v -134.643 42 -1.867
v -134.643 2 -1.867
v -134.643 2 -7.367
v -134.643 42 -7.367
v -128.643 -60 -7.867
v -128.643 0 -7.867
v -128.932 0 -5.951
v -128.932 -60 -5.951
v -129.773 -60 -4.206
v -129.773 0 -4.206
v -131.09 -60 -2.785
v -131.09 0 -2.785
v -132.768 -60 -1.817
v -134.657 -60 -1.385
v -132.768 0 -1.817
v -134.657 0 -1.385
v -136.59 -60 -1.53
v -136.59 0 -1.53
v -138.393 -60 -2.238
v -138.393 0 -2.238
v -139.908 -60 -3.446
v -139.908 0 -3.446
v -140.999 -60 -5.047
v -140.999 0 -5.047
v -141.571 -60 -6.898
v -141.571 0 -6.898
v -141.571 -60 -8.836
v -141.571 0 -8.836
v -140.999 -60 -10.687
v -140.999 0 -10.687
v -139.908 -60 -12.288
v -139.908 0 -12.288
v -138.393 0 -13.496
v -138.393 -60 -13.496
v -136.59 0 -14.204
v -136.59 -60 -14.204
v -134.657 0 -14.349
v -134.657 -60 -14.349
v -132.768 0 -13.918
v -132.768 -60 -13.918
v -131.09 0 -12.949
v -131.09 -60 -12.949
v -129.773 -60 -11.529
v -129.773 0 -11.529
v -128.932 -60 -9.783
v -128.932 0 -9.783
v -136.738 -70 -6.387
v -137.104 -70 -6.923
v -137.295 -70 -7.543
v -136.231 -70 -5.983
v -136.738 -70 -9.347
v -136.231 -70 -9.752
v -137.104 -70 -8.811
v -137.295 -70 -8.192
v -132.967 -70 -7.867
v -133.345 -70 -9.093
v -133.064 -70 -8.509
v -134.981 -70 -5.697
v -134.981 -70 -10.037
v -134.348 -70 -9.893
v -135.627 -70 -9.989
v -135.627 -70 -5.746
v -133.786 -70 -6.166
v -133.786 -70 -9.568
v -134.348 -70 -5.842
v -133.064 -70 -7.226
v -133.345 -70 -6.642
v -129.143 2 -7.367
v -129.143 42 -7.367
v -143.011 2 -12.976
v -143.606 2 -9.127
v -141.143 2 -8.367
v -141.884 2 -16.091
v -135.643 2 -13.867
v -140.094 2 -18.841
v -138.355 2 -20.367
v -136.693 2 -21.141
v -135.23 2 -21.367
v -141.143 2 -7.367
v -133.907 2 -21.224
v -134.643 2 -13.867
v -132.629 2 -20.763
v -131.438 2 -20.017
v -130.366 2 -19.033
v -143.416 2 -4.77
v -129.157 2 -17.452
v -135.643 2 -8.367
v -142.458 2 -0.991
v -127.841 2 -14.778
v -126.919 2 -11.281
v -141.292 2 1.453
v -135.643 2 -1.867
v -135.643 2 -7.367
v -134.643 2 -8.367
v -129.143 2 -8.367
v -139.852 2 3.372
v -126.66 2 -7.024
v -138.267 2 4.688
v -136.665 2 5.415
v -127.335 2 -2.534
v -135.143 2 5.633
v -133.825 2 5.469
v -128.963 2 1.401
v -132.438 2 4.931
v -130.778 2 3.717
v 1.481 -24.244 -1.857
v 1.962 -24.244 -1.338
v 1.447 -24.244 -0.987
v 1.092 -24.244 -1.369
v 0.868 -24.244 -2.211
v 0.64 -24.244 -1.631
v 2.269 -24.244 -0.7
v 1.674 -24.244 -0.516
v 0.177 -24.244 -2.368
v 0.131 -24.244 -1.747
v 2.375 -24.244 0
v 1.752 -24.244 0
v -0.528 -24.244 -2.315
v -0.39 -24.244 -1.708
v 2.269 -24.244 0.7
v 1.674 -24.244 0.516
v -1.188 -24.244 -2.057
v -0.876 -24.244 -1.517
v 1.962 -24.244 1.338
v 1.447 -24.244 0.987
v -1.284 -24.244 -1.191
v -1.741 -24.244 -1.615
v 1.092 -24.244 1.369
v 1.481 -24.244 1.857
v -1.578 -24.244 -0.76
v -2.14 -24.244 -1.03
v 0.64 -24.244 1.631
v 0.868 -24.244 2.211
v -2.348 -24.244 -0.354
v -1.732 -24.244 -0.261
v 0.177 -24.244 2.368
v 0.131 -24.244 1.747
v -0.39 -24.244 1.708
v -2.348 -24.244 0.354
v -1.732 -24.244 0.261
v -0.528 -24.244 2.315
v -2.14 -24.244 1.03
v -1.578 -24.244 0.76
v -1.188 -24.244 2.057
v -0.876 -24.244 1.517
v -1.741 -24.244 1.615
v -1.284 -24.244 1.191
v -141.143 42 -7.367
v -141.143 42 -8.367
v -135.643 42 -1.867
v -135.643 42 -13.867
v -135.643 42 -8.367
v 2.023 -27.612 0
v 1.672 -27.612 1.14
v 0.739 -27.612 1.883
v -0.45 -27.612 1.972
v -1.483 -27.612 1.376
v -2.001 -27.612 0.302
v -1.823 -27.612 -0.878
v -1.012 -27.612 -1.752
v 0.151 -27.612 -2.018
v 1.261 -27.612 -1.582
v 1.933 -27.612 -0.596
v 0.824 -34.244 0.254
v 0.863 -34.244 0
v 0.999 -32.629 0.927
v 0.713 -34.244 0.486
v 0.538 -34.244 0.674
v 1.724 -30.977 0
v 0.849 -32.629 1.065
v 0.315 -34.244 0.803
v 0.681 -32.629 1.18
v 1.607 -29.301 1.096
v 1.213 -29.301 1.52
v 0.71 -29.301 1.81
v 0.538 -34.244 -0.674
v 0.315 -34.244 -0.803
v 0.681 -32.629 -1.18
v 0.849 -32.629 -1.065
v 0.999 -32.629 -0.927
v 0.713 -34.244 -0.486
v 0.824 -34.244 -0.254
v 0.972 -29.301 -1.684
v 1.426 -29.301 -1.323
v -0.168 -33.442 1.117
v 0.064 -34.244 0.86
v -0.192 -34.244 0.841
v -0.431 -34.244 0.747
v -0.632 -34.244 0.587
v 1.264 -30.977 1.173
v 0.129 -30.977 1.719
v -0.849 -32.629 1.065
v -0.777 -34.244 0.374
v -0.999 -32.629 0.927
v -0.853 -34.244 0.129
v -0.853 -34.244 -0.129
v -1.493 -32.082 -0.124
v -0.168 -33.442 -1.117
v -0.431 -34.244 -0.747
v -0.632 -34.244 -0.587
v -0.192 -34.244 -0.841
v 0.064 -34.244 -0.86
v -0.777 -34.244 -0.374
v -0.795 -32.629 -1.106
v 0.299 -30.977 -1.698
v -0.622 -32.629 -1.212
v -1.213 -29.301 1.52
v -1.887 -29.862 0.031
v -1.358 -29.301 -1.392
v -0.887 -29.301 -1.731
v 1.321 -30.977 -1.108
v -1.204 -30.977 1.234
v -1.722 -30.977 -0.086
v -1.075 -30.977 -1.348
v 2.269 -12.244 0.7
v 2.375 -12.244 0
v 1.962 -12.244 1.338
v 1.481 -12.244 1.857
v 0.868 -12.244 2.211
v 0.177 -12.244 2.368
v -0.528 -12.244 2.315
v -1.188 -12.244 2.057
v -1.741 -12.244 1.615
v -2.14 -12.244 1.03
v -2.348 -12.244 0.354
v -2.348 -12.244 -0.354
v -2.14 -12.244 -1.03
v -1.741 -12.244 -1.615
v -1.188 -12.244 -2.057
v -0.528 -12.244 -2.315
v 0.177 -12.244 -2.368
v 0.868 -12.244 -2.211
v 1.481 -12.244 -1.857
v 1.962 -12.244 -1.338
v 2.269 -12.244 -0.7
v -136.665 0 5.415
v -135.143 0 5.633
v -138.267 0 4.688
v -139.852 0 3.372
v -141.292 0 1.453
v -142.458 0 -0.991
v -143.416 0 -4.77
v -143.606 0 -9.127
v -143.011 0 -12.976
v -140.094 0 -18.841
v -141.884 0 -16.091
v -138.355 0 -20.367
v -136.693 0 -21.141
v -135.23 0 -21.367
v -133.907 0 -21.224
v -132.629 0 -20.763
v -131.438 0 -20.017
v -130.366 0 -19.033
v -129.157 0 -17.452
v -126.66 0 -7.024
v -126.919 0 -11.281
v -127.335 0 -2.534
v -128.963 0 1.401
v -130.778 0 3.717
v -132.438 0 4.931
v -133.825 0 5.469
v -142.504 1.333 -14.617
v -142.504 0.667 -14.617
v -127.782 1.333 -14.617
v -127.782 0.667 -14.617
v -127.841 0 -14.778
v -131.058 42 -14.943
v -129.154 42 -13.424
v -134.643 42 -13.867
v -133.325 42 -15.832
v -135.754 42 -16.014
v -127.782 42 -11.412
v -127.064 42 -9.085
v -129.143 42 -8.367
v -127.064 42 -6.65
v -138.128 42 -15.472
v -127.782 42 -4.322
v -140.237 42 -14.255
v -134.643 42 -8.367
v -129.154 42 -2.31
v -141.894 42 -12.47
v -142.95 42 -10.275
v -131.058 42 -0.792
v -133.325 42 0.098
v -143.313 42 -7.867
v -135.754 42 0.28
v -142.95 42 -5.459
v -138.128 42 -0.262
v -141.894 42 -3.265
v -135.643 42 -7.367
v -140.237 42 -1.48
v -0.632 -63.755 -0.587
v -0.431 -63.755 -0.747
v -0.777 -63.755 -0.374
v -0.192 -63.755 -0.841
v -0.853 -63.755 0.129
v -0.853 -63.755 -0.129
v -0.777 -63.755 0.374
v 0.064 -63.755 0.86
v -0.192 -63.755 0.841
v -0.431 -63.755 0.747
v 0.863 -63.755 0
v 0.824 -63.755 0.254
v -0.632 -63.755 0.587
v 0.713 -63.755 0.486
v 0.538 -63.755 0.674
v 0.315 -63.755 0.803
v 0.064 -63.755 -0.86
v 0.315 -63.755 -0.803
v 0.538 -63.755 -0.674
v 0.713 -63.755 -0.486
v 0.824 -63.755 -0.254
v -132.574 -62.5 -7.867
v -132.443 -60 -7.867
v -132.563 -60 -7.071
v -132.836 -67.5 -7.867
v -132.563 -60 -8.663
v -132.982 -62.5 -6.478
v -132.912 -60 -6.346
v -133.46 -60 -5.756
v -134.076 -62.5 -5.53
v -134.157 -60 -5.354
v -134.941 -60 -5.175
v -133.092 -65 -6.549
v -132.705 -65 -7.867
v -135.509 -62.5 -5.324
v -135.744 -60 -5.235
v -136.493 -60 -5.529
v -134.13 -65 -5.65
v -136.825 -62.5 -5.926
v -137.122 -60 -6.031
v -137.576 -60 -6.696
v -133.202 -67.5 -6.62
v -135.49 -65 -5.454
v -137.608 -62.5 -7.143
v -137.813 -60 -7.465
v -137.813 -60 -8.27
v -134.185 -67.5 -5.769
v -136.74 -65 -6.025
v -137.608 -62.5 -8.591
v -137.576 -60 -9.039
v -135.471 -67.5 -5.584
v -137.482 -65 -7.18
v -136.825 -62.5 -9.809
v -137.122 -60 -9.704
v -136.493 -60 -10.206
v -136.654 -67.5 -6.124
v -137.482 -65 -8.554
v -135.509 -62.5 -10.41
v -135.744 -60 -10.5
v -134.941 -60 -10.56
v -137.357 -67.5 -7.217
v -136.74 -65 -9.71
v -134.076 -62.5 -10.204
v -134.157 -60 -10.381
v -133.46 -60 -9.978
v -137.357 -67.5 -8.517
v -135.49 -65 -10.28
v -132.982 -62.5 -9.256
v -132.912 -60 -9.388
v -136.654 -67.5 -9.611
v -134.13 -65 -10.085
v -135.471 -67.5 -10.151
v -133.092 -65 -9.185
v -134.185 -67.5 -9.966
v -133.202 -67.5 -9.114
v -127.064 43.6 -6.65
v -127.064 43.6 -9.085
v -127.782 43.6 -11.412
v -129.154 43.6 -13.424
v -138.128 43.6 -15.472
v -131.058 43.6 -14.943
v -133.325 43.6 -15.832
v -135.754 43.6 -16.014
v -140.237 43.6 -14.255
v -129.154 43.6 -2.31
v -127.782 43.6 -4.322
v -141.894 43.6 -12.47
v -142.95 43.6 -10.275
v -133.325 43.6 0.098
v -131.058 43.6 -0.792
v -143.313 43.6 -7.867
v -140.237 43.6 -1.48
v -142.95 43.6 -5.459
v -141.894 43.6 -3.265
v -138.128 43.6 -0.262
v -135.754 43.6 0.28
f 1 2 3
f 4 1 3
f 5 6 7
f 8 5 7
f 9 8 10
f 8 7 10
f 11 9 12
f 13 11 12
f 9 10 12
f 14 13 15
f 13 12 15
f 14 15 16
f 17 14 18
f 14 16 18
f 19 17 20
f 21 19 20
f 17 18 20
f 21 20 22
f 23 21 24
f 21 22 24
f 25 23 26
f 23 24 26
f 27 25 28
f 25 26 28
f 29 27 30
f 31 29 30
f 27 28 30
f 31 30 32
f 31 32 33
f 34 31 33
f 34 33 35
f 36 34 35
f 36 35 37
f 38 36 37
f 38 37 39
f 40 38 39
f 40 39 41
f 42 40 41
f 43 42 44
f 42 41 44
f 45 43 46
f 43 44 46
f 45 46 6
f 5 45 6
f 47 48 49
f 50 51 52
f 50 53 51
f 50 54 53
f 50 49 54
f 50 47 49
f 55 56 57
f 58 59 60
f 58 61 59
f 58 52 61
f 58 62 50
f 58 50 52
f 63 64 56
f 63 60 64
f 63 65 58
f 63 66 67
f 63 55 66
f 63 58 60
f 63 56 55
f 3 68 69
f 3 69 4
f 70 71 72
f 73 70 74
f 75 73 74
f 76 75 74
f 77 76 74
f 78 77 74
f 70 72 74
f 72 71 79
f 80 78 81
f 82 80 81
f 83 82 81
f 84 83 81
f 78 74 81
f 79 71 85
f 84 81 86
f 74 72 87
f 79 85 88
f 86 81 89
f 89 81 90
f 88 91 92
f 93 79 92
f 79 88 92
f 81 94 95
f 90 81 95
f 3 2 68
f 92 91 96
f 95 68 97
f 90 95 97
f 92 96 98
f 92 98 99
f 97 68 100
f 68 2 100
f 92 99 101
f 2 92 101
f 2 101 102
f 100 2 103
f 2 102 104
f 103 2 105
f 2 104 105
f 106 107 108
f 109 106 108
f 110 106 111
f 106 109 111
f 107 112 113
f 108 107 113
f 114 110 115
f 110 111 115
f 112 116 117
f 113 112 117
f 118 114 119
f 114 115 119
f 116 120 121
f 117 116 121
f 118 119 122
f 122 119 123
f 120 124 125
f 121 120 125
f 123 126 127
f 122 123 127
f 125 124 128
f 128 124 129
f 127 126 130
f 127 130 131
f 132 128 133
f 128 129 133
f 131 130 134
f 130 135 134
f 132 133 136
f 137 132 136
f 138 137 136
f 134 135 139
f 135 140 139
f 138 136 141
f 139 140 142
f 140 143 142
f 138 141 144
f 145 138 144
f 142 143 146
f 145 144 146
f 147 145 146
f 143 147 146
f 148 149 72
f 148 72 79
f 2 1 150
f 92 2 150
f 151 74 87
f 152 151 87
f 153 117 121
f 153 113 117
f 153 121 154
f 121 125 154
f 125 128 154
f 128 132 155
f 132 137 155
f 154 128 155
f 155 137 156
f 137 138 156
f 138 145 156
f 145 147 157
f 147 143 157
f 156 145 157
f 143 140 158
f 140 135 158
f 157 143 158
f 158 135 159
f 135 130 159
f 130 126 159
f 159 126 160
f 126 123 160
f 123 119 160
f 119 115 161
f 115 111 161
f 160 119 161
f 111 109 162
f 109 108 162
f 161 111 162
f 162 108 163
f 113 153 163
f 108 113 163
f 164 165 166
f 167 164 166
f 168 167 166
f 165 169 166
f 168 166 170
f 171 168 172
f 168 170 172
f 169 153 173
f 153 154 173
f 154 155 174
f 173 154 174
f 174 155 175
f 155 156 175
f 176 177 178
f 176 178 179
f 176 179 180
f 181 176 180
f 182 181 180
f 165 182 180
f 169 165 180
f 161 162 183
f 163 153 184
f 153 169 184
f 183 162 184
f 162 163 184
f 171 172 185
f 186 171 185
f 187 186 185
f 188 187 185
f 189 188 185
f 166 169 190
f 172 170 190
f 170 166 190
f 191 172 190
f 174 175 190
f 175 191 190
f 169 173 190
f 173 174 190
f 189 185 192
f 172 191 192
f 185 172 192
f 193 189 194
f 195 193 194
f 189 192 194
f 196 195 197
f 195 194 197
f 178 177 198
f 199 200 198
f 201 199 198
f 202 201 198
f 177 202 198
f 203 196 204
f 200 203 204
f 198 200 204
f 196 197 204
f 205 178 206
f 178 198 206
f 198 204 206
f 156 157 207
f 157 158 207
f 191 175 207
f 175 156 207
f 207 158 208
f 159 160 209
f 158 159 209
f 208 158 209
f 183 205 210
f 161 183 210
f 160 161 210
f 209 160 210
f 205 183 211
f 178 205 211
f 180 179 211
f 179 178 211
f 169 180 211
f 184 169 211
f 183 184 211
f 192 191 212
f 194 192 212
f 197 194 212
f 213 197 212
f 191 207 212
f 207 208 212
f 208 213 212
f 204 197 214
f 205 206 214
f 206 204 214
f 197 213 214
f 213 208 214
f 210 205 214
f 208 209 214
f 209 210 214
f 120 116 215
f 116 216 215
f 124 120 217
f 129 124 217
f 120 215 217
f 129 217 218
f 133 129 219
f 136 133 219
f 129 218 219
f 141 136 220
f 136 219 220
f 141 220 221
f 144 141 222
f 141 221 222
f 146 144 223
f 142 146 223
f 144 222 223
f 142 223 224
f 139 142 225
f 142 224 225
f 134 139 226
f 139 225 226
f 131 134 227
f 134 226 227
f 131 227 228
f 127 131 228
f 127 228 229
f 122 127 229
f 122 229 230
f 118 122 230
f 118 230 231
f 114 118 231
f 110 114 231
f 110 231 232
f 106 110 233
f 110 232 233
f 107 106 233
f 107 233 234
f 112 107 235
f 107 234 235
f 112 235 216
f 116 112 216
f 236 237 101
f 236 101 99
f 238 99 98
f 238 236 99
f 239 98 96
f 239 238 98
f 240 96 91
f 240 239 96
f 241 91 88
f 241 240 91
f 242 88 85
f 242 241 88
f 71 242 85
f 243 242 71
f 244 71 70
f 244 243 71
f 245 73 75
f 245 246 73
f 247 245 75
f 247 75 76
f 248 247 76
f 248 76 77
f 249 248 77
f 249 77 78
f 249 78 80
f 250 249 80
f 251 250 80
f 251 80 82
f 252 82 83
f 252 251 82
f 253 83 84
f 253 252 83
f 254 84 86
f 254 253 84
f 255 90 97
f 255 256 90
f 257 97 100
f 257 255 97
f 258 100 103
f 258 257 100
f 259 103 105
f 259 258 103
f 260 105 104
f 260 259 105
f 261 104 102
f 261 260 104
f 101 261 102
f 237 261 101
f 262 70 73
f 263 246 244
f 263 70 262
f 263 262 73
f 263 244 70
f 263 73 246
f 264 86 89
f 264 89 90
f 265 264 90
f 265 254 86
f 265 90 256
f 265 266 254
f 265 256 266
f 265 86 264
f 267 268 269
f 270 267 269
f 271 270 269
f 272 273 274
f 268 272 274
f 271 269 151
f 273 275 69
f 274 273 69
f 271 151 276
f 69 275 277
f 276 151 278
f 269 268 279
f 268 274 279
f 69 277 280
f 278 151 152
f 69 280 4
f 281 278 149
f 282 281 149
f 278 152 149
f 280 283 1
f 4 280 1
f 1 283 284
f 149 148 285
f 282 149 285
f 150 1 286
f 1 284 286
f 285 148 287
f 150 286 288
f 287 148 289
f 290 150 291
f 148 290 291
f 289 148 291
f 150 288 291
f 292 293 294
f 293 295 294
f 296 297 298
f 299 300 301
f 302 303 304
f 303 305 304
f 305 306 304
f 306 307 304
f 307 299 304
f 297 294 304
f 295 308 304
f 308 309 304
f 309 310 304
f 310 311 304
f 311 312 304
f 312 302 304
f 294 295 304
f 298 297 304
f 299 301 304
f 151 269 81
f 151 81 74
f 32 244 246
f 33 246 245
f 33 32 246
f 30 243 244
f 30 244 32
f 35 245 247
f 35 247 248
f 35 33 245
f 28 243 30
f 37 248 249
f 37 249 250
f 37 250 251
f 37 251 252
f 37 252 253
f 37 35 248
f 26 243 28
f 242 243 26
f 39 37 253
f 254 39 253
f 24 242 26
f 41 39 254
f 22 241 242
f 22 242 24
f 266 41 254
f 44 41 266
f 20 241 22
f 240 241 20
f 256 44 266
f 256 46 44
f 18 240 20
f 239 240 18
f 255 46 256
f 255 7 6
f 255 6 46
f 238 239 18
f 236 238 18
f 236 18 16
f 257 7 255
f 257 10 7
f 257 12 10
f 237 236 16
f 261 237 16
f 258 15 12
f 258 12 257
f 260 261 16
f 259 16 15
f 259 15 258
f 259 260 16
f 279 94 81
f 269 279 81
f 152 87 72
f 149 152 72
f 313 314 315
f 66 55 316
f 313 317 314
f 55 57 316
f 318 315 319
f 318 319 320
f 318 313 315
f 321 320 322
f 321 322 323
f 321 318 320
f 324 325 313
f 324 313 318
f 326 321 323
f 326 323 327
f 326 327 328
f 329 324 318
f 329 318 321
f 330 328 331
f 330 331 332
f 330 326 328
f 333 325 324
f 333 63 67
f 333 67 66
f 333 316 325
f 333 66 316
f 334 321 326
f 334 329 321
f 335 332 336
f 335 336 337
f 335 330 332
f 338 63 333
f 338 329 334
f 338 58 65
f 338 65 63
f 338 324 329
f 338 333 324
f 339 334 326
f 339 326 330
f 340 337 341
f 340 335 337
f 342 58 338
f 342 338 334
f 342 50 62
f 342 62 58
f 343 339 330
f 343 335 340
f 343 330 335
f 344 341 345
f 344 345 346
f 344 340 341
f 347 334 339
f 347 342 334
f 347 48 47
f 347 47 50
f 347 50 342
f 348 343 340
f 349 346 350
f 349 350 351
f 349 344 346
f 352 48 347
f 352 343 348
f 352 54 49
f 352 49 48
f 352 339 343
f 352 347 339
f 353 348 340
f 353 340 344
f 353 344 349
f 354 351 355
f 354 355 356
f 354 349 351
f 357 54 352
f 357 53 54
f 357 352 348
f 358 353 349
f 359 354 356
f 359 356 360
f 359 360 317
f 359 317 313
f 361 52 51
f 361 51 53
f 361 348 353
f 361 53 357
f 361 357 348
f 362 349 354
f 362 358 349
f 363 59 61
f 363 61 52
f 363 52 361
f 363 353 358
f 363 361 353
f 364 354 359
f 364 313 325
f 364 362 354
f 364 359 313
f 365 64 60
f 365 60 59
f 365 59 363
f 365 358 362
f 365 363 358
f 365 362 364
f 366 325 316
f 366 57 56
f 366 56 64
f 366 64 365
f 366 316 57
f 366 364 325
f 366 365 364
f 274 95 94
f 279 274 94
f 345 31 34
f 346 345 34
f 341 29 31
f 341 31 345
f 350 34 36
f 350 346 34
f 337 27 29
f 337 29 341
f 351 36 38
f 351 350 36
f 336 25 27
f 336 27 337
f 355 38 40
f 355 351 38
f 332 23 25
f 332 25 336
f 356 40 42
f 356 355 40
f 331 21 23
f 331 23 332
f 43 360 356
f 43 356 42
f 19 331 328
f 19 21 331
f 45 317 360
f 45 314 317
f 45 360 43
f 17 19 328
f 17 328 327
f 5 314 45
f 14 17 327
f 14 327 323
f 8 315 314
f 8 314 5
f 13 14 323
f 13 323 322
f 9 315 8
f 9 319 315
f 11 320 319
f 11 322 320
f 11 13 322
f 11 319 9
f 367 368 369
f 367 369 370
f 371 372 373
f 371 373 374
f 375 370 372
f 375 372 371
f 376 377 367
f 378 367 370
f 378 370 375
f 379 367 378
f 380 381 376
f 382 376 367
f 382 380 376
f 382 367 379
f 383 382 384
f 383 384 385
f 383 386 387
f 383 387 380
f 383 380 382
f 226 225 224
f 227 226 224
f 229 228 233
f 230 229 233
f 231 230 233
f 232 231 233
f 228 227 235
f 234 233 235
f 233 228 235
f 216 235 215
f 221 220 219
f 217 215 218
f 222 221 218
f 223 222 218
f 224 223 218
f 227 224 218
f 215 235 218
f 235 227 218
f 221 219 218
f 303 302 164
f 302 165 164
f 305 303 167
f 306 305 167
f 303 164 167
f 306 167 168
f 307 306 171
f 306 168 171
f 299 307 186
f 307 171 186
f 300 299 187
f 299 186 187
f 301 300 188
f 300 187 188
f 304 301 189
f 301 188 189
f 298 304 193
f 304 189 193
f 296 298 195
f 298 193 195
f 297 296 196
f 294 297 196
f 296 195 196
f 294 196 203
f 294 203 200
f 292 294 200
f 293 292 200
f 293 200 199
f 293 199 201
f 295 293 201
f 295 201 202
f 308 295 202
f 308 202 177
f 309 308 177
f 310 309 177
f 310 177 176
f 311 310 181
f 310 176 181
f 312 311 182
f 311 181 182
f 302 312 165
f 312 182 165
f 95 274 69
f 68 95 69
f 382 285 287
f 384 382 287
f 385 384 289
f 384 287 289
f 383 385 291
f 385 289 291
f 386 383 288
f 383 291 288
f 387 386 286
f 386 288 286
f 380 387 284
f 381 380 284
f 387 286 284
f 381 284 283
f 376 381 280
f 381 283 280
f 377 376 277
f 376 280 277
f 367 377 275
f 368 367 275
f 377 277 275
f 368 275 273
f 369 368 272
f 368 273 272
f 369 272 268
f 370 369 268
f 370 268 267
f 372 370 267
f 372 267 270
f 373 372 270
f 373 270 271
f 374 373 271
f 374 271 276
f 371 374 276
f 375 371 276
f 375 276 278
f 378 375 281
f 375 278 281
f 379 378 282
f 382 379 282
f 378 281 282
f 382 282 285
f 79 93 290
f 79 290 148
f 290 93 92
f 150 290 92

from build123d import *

# Parameters (mm, degrees)
F0_R     = 6.5
F1_DEPTH = 2
F2_DEPTH = 60
F3_W     = 1
F3_H     = 1
F3_H_2   = 5.5
F3_W_2   = 5.5
F4_DEPTH = 40
F5_R     = 8.17
F6_DEPTH = 1.6
F7_R     = 2.7
F8_DEPTH = 10
F8_TAPER = 3


with BuildPart() as f1:
    # F0 (on Front) → F1 (new body)
    with BuildSketch(Plane.XZ):
        with BuildLine():
            add(Edge.make_bspline(
                [(-135.1431305561, 5.6327479952), (-149.8655624204, 5.6327479952), (-142.5043464882, -14.6172520048), (-135.1431305561, -34.8672520048), (-127.7819146239, -14.6172520048), (-120.4206986917, 5.6327479952), (-135.1431305561, 5.6327479952)],
                knots=[0, 0, 0, 2.0943951024, 2.0943951024, 4.1887902048, 4.1887902048, 6.2831853072, 6.2831853072, 6.2831853072], degree=2, weights=[1, 0.5, 1, 0.5, 1, 0.5, 1]))
        make_face()
        with Locations((-135.1431305561, -7.8672520048)):
            Circle(F0_R, mode=Mode.SUBTRACT)
        with Locations((-135.1431305561, -7.8672520048)):
            Circle(F0_R)
    extrude(amount=-F1_DEPTH)

    # F0 (on Front) → F2 (join)
    with BuildSketch(Plane.XZ):
        with Locations((-135.1431305561, -7.8672520048)):
            Circle(F0_R)
    extrude(amount=F2_DEPTH)

    # F3 (on face) → F4 (join)
    with BuildSketch(Plane(origin=(0, 2, 0), x_dir=(-1, 0, 0), z_dir=(0, 1, 0))):
        with Locations((135.1431305561, -7.8672520048)):
            Rectangle(F3_W, F3_H)
        with Locations((135.1431305561, -4.6172520048)):
            Rectangle(F3_W, F3_H_2)
        with Locations((138.3931305561, -7.8672520048)):
            Rectangle(F3_W_2, F3_H)
        with Locations((135.1431305561, -11.1172520048)):
            Rectangle(F3_W, F3_H_2)
        with Locations((131.8931305561, -7.8672520048)):
            Rectangle(F3_W_2, F3_H)
    extrude(amount=F4_DEPTH)

    # F5 (on face) → F6 (join)
    with BuildSketch(Plane(origin=(0, 42, 0), x_dir=(-1, 0, 0), z_dir=(0, 1, 0))):
        with Locations((135.1431305561, -7.8672520048)):
            Circle(F5_R)
        Polygon((135.6431305561, -1.8672520048), (135.6431305561, -7.3672520048), (141.1431305561, -7.3672520048), (141.1431305561, -8.3672520048), (135.6431305561, -8.3672520048), (135.6431305561, -13.8672520048), (134.6431305561, -13.8672520048), (134.6431305561, -8.3672520048), (129.1431305561, -8.3672520048), (129.1431305561, -7.3672520048), (134.6431305561, -7.3672520048), (134.6431305561, -1.8672520048), align=None, mode=Mode.SUBTRACT)
        Polygon((141.1431305561, -7.3672520048), (135.6431305561, -7.3672520048), (135.6431305561, -1.8672520048), (134.6431305561, -1.8672520048), (134.6431305561, -7.3672520048), (129.1431305561, -7.3672520048), (129.1431305561, -8.3672520048), (134.6431305561, -8.3672520048), (134.6431305561, -13.8672520048), (135.6431305561, -13.8672520048), (135.6431305561, -8.3672520048), (141.1431305561, -8.3672520048), align=None)
    extrude(amount=F6_DEPTH)

    # F7 (on face) → F8 (join)
    with BuildSketch(Plane.XZ.offset(60)):
        with Locations((-135.1431305561, -7.8672520048)):
            Circle(F7_R)
    extrude(amount=F8_DEPTH, taper=F8_TAPER)


with BuildPart() as f10:
    # F9 (on Top) → F10 (revolve)
    with BuildSketch(Plane.XY):
        Polygon((0, -24.2443063855), (1.7516354565, -24.2443063855), (2.375, -24.2443063855), (2.375, -12.2443063855), (0, -12.2443063855), align=None)
        with BuildLine():
            Line((0, -63.7547517743), (0.8625133196, -63.7547517743))
            Line((0.8625133196, -63.7547517743), (0.8625133196, -34.2443063855))
            ThreePointArc((0.8625133196, -34.2443063855), (1.9447499627, -29.3010035325), (1.7516354565, -24.2443063855))
            Line((1.7516354565, -24.2443063855), (0, -24.2443063855))
            Line((0, -24.2443063855), (0, -63.7547517743))
        make_face()
    revolve(axis=Axis((0, -31.8773758872, 0), (0, -1, 0)))


solid = Compound([f1.part, f10.part])
